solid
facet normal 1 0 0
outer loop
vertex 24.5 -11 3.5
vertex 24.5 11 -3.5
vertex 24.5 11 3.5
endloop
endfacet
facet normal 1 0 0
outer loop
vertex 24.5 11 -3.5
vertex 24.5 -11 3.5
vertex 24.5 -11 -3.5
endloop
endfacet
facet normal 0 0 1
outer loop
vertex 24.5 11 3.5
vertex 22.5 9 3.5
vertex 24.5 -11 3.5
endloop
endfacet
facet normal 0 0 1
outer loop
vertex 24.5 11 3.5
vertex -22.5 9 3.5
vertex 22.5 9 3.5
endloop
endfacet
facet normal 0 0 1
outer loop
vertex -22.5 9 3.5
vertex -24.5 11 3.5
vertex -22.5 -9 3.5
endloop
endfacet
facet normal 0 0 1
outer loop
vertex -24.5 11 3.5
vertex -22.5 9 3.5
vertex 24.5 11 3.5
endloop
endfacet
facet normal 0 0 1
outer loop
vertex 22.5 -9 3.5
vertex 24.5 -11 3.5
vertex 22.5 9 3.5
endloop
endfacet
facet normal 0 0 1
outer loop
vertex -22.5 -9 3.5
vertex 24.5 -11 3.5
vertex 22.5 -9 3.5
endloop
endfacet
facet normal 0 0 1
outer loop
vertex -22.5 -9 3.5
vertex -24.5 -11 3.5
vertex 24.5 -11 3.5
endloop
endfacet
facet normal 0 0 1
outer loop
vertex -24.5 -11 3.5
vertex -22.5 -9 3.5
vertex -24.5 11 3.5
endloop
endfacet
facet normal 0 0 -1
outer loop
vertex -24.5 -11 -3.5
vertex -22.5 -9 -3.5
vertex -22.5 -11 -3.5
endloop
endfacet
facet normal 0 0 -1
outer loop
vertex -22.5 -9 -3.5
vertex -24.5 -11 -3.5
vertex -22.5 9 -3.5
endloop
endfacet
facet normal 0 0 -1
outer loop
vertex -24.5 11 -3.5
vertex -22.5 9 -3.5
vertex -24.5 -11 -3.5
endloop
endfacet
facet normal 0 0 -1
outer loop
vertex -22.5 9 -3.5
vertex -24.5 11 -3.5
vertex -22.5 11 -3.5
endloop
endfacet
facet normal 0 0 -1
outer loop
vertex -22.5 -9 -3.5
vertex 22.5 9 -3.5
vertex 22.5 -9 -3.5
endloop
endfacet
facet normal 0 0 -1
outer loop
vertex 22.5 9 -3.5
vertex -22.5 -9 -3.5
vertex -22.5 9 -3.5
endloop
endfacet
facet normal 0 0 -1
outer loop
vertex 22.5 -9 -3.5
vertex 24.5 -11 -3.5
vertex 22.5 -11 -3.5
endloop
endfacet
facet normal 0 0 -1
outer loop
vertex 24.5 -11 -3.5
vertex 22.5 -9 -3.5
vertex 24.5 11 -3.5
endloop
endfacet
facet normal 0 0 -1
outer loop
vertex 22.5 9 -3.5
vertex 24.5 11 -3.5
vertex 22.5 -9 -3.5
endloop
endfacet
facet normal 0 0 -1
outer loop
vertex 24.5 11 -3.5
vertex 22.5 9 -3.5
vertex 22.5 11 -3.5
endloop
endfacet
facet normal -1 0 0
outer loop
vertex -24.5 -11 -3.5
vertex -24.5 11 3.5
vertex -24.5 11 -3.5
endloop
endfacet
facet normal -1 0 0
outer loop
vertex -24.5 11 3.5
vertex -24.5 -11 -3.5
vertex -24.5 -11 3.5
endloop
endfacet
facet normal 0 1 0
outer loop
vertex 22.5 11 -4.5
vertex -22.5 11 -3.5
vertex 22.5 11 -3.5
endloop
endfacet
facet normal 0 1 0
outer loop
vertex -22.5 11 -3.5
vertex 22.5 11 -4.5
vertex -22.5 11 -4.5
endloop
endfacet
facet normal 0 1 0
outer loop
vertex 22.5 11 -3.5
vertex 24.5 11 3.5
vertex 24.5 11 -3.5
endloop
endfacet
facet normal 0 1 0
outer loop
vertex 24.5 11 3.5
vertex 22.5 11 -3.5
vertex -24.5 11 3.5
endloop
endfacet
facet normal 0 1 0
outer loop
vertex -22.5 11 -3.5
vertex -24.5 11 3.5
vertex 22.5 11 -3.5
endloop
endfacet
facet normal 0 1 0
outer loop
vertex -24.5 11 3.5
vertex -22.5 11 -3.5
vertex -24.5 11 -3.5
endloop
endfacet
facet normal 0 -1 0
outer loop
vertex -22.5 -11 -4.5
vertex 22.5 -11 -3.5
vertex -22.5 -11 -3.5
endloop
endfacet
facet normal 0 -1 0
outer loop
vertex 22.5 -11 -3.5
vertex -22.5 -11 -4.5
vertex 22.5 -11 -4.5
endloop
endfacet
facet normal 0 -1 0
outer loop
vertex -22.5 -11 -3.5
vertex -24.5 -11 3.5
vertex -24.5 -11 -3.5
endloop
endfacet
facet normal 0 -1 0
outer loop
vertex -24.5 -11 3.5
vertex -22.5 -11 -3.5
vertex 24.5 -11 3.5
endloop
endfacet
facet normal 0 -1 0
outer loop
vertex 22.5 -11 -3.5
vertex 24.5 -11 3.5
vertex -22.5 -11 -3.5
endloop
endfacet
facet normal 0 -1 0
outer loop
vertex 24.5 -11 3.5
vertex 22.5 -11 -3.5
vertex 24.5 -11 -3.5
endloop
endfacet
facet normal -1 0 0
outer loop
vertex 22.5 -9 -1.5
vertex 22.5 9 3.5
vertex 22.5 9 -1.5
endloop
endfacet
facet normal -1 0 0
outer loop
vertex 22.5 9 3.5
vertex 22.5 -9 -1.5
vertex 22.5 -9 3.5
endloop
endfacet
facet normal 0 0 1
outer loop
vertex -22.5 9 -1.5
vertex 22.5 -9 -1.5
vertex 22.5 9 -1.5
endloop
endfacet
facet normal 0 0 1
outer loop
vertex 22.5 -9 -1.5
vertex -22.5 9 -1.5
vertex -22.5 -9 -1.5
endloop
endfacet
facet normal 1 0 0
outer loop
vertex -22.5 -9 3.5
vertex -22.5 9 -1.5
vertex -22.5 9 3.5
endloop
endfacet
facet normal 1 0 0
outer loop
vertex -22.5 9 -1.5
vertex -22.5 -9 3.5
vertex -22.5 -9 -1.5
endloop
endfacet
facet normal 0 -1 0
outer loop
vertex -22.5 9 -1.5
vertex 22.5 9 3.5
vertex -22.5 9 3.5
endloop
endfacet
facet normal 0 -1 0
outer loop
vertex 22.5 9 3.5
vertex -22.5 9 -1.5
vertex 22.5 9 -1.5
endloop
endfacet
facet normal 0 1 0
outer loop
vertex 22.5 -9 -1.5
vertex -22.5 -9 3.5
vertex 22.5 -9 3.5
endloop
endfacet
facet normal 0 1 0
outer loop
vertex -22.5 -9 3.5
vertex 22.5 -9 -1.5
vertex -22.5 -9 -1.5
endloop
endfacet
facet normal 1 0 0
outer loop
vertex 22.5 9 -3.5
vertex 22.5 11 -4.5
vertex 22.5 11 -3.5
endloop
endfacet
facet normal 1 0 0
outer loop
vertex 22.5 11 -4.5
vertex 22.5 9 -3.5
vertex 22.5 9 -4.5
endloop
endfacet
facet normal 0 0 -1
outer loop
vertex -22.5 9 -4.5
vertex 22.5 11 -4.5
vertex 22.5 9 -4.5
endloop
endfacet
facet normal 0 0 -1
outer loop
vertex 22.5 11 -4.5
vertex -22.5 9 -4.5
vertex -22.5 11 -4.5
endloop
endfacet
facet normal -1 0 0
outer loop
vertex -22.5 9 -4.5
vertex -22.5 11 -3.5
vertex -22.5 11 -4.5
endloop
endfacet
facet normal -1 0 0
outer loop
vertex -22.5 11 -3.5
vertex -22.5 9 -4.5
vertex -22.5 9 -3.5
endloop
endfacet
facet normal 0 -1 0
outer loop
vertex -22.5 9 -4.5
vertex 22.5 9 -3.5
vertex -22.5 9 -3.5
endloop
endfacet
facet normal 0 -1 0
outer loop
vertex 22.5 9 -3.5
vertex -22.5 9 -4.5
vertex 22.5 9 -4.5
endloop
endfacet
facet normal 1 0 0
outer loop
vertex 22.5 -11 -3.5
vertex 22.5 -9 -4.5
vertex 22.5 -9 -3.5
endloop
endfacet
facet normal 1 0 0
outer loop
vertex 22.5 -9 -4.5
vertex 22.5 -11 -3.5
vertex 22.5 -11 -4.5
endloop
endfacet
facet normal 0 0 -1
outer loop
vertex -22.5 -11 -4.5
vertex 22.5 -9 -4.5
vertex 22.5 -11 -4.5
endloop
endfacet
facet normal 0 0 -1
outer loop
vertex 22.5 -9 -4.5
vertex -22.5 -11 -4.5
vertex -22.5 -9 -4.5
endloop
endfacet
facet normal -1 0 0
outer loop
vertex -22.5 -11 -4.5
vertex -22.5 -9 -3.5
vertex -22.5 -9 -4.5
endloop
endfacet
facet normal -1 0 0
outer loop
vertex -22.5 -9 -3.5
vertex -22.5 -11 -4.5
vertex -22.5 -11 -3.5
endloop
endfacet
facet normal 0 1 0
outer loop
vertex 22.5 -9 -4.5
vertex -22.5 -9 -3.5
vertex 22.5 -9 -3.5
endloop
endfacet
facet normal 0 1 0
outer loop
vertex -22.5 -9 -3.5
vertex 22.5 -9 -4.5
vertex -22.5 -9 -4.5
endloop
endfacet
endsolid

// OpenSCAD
// Parameters for Arduino Nano dimensions
nano_length = 45; // Length of the Arduino Nano
nano_width = 18;  // Width of the Arduino Nano
nano_height = 5;  // Height of the Arduino Nano
usb_cutout_width = 12; // Width of the USB port cutout
usb_cutout_height = 4; // Height of the USB port cutout
usb_cutout_depth = 2;  // Depth of the USB port cutout
wall_thickness = 2;    // Thickness of the case walls
snap_fit_height = 2;   // Height of the snap fit feature

// Main case
module nano_case() {
    difference() {
        // Outer case
        cube([nano_length + 2 * wall_thickness, nano_width + 2 * wall_thickness, nano_height + wall_thickness], center=true);
        
        // Inner cavity for Arduino Nano
        translate([0, 0, wall_thickness / 2])
            cube([nano_length, nano_width, nano_height], center=true);
        
        // USB port cutout
        translate([nano_length / 2 - usb_cutout_depth, 0, nano_height / 2 - usb_cutout_height / 2])
            cube([usb_cutout_depth, usb_cutout_width, usb_cutout_height], center=true);
    }
}

// Snap fit feature
module snap_fit() {
    translate([0, 0, -nano_height / 2 - snap_fit_height / 2])
        cube([nano_length, wall_thickness, snap_fit_height], center=true);
}

// Assemble the Arduino Nano holder
union() {
    nano_case();
    translate([0, nano_width / 2 + wall_thickness / 2, 0])
        snap_fit();
    translate([0, -(nano_width / 2 + wall_thickness / 2), 0])
        snap_fit();
}
